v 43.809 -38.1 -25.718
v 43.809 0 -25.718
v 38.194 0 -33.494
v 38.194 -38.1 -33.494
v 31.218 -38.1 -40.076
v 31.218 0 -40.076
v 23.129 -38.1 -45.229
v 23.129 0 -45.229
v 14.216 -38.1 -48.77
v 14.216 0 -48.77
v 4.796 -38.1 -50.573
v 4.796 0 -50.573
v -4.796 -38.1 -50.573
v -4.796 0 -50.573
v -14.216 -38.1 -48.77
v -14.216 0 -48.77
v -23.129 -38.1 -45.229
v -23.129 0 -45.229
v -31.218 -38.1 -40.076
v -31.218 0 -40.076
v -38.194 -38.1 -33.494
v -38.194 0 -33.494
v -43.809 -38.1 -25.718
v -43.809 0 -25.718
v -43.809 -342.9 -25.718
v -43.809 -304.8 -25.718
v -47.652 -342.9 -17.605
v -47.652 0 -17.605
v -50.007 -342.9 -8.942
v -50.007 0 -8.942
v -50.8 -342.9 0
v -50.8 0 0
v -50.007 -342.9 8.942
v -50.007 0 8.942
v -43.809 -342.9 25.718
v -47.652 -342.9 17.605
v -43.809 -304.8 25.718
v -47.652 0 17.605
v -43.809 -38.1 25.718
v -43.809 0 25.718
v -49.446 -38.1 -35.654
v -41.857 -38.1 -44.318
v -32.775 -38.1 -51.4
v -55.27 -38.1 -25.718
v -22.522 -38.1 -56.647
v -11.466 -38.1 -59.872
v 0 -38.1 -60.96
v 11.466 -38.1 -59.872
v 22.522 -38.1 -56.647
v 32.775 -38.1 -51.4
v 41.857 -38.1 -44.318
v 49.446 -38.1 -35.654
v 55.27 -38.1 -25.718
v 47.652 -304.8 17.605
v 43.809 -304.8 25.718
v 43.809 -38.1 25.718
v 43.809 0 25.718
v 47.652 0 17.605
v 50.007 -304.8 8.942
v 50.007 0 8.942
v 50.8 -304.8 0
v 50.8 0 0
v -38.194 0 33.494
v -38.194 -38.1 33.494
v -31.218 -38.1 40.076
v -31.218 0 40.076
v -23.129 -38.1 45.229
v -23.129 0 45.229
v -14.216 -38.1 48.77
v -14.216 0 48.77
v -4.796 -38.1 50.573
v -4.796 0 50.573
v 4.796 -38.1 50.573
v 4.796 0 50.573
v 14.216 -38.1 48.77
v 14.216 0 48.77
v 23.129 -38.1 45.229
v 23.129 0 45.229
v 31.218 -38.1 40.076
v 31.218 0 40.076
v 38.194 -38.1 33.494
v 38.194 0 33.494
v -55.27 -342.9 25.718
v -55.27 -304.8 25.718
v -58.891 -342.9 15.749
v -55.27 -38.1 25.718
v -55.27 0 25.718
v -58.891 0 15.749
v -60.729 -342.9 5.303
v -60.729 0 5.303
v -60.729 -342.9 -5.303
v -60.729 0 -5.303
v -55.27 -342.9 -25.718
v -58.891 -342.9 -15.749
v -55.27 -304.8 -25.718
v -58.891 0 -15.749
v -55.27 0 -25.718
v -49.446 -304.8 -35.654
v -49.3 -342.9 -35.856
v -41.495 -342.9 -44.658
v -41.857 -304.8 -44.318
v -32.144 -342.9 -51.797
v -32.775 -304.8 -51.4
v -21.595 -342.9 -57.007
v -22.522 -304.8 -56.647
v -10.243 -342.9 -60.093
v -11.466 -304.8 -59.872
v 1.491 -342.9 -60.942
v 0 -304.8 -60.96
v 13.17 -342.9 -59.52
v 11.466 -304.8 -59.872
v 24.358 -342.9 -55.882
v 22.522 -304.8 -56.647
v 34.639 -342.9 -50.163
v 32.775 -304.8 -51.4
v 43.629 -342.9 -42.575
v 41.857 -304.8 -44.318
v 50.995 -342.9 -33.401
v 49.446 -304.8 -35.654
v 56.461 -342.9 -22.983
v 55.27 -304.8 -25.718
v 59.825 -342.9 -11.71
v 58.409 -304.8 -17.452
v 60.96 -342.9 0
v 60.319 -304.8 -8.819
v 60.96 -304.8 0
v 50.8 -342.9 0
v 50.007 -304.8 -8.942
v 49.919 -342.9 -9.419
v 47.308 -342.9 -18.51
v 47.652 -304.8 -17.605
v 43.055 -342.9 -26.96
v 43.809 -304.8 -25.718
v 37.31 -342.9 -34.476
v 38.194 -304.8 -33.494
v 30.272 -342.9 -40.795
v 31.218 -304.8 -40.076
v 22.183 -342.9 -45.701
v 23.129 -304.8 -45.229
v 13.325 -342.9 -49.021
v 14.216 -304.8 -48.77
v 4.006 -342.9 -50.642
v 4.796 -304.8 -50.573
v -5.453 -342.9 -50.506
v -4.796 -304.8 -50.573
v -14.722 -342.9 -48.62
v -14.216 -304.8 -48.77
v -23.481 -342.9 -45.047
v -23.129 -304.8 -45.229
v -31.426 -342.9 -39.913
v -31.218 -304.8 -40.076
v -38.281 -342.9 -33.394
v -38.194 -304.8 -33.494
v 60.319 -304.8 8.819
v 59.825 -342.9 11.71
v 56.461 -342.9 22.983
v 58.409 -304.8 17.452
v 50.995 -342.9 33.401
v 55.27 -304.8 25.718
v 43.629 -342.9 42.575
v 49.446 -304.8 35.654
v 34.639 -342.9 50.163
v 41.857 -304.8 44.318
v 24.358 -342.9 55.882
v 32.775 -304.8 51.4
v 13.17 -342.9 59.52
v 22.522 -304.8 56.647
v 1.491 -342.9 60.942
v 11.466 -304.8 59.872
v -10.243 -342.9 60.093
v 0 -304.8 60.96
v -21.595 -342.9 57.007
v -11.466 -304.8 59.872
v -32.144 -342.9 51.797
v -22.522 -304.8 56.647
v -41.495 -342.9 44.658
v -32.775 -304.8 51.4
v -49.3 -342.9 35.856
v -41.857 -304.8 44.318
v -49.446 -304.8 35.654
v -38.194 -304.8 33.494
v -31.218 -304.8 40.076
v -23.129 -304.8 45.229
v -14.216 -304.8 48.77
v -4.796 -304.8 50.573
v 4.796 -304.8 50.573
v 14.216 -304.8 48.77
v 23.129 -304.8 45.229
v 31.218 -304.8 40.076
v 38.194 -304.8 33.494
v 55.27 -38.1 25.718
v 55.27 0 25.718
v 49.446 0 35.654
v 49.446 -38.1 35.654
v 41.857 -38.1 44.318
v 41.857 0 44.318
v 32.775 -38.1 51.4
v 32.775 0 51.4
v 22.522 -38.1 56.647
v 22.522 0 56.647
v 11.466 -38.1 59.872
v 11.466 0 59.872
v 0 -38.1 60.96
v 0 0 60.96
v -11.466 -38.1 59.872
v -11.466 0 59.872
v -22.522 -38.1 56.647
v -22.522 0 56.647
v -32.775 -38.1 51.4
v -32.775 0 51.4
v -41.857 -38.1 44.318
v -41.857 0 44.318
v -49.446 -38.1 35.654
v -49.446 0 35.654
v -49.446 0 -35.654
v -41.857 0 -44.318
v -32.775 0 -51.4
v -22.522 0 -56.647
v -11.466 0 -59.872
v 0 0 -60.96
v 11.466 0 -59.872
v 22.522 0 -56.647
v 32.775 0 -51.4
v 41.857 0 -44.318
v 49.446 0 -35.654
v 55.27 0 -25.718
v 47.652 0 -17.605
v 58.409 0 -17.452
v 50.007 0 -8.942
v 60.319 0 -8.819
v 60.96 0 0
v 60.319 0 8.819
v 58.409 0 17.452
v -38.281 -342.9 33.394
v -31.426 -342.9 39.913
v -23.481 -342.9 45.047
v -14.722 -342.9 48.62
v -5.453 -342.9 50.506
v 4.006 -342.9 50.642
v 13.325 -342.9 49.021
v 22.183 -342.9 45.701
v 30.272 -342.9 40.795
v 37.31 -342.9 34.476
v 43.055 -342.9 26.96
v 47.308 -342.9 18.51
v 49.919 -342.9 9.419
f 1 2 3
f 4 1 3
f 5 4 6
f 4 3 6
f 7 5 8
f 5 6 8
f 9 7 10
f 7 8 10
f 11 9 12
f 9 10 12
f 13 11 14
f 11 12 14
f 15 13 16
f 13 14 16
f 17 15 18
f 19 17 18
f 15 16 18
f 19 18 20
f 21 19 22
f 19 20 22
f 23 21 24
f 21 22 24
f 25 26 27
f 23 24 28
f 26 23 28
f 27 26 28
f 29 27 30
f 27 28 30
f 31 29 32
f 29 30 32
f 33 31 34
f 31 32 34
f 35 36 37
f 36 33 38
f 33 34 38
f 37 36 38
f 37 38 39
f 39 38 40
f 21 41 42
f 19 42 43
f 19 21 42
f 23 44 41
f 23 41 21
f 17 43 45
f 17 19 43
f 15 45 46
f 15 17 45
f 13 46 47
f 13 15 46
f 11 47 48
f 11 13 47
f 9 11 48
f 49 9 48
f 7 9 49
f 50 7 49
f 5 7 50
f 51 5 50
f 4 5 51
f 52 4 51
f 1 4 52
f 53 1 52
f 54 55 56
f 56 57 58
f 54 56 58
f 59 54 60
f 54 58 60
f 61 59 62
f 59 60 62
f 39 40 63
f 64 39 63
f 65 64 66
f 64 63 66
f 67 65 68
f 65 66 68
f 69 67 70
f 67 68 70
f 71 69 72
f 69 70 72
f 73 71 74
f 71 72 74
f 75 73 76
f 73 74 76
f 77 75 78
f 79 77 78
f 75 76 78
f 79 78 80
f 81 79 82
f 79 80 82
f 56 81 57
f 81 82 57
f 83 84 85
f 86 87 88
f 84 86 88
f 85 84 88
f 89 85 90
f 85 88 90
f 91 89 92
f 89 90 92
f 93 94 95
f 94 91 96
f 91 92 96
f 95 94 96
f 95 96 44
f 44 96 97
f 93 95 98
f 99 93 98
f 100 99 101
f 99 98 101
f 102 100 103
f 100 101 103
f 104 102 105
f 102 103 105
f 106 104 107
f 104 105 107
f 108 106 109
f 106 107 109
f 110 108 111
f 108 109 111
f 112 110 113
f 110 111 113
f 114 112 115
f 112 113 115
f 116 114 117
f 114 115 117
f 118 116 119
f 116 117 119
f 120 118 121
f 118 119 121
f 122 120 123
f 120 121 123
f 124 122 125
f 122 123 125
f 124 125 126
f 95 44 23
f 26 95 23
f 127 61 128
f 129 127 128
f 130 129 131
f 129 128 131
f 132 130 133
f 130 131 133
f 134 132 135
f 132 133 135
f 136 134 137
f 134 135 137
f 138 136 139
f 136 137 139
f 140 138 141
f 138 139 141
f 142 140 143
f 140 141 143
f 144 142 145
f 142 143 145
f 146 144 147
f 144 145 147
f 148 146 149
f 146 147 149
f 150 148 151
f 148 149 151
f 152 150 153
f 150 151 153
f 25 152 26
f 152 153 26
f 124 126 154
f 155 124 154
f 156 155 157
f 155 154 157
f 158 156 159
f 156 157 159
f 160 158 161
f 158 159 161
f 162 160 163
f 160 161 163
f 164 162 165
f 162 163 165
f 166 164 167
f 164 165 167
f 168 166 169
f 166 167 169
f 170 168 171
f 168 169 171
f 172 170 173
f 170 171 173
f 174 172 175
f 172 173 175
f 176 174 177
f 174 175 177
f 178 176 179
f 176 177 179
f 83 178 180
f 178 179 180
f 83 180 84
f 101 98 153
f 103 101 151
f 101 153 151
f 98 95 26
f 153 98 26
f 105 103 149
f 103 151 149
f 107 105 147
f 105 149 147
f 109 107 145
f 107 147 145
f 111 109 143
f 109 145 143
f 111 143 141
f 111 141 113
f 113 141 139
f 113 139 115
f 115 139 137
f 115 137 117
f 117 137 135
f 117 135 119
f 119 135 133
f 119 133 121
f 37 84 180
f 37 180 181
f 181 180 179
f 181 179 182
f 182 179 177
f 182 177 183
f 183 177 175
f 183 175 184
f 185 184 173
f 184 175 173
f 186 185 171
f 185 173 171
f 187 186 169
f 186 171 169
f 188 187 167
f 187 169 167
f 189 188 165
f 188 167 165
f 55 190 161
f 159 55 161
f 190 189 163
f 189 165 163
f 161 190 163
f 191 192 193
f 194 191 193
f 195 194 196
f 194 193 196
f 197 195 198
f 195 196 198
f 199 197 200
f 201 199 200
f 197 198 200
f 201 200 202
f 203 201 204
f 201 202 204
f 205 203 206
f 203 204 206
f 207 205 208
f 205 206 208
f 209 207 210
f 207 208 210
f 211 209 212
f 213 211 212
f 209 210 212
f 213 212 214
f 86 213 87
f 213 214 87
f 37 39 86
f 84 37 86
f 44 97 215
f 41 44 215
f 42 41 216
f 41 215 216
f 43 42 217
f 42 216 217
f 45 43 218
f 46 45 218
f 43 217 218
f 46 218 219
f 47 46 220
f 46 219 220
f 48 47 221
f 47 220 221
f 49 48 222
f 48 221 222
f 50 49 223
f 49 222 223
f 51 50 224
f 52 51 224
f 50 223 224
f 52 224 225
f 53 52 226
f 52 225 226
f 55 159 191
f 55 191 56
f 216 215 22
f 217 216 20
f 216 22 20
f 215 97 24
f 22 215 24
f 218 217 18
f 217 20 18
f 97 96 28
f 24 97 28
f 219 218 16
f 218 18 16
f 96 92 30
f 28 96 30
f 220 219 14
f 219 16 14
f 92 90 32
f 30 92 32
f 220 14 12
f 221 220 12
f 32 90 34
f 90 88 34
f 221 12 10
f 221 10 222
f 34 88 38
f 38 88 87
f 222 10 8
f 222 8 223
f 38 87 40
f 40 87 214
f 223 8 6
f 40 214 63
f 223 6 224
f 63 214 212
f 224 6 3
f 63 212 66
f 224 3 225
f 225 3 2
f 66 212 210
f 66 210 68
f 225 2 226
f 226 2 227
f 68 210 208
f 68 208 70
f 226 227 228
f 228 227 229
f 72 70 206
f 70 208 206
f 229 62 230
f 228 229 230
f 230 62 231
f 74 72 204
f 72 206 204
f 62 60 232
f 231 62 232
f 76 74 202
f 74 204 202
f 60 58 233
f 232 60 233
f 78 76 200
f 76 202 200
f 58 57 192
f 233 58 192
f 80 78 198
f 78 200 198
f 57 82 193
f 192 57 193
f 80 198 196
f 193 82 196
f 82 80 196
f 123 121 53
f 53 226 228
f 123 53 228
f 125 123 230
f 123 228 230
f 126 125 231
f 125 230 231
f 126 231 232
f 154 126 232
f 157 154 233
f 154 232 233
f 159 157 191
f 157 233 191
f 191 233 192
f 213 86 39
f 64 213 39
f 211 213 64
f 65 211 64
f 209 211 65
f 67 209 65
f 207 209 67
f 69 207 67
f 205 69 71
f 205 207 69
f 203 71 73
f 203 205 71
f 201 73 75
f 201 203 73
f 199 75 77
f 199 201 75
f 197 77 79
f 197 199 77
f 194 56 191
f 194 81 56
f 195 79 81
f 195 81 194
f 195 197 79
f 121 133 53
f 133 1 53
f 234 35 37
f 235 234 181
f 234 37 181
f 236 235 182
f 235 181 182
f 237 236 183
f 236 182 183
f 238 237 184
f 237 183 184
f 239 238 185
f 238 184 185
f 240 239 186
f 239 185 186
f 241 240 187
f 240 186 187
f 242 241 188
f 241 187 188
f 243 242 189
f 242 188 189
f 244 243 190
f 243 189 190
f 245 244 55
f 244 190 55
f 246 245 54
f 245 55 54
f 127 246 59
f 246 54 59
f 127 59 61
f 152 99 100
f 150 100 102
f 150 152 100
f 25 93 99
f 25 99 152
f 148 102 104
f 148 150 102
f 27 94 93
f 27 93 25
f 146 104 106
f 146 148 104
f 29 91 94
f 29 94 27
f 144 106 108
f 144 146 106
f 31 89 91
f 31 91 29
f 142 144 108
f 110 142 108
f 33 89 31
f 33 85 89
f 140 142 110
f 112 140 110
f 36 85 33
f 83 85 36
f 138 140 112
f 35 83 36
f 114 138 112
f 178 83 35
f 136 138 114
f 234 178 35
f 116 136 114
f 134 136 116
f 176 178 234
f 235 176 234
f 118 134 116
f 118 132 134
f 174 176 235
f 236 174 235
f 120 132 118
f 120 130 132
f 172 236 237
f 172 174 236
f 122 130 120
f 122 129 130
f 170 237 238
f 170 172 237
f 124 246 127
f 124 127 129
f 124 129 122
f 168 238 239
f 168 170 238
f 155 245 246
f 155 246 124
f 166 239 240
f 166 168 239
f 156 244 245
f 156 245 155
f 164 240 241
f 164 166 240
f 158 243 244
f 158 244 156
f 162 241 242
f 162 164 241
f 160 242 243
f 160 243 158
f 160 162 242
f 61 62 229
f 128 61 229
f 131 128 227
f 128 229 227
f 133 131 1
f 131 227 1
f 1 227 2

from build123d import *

# Parameters (mm, degrees)
F1_DEPTH = 304.8
F2_DEPTH = 38.1
F4_DEPTH = 38.1


with BuildPart() as f1:
    # F0 (on Front) → F1 (new body)
    with BuildSketch(Plane.XZ):
        with BuildLine():
            Line((-43.809108, 25.717738), (-55.269517, 25.717738))
            ThreePointArc((-55.269517, 25.717738), (-60.96, 0), (-55.269517, -25.717738))
            Line((-55.269517, -25.717738), (-43.809108, -25.717738))
            ThreePointArc((-43.809108, -25.717738), (-50.8, 0), (-43.809108, 25.717738))
        make_face()
        with BuildLine():
            ThreePointArc((55.269517, -25.717738), (59.52038, -13.169887), (60.96, 0))
            ThreePointArc((60.96, 0), (59.52038, 13.169887), (55.269517, 25.717738))
            Line((55.269517, 25.717738), (43.809108, 25.717738))
            ThreePointArc((43.809108, 25.717738), (49.021132, 13.325489), (50.8, 0))
            ThreePointArc((50.8, 0), (49.021132, -13.325489), (43.809108, -25.717738))
            Line((43.809108, -25.717738), (55.269517, -25.717738))
        make_face()
    extrude(amount=F1_DEPTH)

    # F0 (on Front) → F2 (join)
    with BuildSketch(Plane.XZ):
        with BuildLine():
            Line((43.809108, 25.717738), (55.269517, 25.717738))
            ThreePointArc((55.269517, 25.717738), (0, 60.96), (-55.269517, 25.717738))
            Line((-55.269517, 25.717738), (-43.809108, 25.717738))
            ThreePointArc((-43.809108, 25.717738), (0, 50.8), (43.809108, 25.717738))
        make_face()
        with BuildLine():
            ThreePointArc((-55.269517, -25.717738), (0, -60.96), (55.269517, -25.717738))
            Line((55.269517, -25.717738), (43.809108, -25.717738))
            ThreePointArc((43.809108, -25.717738), (0, -50.8), (-43.809108, -25.717738))
            Line((-43.809108, -25.717738), (-55.269517, -25.717738))
        make_face()
    extrude(amount=F2_DEPTH)

    # F3 (on face) → F4 (join)
    with BuildSketch(Plane.XZ.offset(304.8)):
        with BuildLine():
            Line((-43.809108, 25.717738), (-55.269517, 25.717738))
            ThreePointArc((-55.269517, 25.717738), (-60.96, 0), (-55.269517, -25.717738))
            Line((-55.269517, -25.717738), (-43.809108, -25.717738))
            ThreePointArc((-43.809108, -25.717738), (-50.8, 0), (-43.809108, 25.717738))
        make_face()
        with BuildLine():
            ThreePointArc((-55.269517, -25.717738), (13.169887, -59.52038), (60.96, 0))
            ThreePointArc((60.96, 0), (13.169887, 59.52038), (-55.269517, 25.717738))
            Line((-55.269517, 25.717738), (-43.809108, 25.717738))
            ThreePointArc((-43.809108, 25.717738), (13.325489, 49.021132), (50.8, 0))
            ThreePointArc((50.8, 0), (13.325489, -49.021132), (-43.809108, -25.717738))
            Line((-43.809108, -25.717738), (-55.269517, -25.717738))
        make_face()
    extrude(amount=F4_DEPTH)


solid = f1.part
